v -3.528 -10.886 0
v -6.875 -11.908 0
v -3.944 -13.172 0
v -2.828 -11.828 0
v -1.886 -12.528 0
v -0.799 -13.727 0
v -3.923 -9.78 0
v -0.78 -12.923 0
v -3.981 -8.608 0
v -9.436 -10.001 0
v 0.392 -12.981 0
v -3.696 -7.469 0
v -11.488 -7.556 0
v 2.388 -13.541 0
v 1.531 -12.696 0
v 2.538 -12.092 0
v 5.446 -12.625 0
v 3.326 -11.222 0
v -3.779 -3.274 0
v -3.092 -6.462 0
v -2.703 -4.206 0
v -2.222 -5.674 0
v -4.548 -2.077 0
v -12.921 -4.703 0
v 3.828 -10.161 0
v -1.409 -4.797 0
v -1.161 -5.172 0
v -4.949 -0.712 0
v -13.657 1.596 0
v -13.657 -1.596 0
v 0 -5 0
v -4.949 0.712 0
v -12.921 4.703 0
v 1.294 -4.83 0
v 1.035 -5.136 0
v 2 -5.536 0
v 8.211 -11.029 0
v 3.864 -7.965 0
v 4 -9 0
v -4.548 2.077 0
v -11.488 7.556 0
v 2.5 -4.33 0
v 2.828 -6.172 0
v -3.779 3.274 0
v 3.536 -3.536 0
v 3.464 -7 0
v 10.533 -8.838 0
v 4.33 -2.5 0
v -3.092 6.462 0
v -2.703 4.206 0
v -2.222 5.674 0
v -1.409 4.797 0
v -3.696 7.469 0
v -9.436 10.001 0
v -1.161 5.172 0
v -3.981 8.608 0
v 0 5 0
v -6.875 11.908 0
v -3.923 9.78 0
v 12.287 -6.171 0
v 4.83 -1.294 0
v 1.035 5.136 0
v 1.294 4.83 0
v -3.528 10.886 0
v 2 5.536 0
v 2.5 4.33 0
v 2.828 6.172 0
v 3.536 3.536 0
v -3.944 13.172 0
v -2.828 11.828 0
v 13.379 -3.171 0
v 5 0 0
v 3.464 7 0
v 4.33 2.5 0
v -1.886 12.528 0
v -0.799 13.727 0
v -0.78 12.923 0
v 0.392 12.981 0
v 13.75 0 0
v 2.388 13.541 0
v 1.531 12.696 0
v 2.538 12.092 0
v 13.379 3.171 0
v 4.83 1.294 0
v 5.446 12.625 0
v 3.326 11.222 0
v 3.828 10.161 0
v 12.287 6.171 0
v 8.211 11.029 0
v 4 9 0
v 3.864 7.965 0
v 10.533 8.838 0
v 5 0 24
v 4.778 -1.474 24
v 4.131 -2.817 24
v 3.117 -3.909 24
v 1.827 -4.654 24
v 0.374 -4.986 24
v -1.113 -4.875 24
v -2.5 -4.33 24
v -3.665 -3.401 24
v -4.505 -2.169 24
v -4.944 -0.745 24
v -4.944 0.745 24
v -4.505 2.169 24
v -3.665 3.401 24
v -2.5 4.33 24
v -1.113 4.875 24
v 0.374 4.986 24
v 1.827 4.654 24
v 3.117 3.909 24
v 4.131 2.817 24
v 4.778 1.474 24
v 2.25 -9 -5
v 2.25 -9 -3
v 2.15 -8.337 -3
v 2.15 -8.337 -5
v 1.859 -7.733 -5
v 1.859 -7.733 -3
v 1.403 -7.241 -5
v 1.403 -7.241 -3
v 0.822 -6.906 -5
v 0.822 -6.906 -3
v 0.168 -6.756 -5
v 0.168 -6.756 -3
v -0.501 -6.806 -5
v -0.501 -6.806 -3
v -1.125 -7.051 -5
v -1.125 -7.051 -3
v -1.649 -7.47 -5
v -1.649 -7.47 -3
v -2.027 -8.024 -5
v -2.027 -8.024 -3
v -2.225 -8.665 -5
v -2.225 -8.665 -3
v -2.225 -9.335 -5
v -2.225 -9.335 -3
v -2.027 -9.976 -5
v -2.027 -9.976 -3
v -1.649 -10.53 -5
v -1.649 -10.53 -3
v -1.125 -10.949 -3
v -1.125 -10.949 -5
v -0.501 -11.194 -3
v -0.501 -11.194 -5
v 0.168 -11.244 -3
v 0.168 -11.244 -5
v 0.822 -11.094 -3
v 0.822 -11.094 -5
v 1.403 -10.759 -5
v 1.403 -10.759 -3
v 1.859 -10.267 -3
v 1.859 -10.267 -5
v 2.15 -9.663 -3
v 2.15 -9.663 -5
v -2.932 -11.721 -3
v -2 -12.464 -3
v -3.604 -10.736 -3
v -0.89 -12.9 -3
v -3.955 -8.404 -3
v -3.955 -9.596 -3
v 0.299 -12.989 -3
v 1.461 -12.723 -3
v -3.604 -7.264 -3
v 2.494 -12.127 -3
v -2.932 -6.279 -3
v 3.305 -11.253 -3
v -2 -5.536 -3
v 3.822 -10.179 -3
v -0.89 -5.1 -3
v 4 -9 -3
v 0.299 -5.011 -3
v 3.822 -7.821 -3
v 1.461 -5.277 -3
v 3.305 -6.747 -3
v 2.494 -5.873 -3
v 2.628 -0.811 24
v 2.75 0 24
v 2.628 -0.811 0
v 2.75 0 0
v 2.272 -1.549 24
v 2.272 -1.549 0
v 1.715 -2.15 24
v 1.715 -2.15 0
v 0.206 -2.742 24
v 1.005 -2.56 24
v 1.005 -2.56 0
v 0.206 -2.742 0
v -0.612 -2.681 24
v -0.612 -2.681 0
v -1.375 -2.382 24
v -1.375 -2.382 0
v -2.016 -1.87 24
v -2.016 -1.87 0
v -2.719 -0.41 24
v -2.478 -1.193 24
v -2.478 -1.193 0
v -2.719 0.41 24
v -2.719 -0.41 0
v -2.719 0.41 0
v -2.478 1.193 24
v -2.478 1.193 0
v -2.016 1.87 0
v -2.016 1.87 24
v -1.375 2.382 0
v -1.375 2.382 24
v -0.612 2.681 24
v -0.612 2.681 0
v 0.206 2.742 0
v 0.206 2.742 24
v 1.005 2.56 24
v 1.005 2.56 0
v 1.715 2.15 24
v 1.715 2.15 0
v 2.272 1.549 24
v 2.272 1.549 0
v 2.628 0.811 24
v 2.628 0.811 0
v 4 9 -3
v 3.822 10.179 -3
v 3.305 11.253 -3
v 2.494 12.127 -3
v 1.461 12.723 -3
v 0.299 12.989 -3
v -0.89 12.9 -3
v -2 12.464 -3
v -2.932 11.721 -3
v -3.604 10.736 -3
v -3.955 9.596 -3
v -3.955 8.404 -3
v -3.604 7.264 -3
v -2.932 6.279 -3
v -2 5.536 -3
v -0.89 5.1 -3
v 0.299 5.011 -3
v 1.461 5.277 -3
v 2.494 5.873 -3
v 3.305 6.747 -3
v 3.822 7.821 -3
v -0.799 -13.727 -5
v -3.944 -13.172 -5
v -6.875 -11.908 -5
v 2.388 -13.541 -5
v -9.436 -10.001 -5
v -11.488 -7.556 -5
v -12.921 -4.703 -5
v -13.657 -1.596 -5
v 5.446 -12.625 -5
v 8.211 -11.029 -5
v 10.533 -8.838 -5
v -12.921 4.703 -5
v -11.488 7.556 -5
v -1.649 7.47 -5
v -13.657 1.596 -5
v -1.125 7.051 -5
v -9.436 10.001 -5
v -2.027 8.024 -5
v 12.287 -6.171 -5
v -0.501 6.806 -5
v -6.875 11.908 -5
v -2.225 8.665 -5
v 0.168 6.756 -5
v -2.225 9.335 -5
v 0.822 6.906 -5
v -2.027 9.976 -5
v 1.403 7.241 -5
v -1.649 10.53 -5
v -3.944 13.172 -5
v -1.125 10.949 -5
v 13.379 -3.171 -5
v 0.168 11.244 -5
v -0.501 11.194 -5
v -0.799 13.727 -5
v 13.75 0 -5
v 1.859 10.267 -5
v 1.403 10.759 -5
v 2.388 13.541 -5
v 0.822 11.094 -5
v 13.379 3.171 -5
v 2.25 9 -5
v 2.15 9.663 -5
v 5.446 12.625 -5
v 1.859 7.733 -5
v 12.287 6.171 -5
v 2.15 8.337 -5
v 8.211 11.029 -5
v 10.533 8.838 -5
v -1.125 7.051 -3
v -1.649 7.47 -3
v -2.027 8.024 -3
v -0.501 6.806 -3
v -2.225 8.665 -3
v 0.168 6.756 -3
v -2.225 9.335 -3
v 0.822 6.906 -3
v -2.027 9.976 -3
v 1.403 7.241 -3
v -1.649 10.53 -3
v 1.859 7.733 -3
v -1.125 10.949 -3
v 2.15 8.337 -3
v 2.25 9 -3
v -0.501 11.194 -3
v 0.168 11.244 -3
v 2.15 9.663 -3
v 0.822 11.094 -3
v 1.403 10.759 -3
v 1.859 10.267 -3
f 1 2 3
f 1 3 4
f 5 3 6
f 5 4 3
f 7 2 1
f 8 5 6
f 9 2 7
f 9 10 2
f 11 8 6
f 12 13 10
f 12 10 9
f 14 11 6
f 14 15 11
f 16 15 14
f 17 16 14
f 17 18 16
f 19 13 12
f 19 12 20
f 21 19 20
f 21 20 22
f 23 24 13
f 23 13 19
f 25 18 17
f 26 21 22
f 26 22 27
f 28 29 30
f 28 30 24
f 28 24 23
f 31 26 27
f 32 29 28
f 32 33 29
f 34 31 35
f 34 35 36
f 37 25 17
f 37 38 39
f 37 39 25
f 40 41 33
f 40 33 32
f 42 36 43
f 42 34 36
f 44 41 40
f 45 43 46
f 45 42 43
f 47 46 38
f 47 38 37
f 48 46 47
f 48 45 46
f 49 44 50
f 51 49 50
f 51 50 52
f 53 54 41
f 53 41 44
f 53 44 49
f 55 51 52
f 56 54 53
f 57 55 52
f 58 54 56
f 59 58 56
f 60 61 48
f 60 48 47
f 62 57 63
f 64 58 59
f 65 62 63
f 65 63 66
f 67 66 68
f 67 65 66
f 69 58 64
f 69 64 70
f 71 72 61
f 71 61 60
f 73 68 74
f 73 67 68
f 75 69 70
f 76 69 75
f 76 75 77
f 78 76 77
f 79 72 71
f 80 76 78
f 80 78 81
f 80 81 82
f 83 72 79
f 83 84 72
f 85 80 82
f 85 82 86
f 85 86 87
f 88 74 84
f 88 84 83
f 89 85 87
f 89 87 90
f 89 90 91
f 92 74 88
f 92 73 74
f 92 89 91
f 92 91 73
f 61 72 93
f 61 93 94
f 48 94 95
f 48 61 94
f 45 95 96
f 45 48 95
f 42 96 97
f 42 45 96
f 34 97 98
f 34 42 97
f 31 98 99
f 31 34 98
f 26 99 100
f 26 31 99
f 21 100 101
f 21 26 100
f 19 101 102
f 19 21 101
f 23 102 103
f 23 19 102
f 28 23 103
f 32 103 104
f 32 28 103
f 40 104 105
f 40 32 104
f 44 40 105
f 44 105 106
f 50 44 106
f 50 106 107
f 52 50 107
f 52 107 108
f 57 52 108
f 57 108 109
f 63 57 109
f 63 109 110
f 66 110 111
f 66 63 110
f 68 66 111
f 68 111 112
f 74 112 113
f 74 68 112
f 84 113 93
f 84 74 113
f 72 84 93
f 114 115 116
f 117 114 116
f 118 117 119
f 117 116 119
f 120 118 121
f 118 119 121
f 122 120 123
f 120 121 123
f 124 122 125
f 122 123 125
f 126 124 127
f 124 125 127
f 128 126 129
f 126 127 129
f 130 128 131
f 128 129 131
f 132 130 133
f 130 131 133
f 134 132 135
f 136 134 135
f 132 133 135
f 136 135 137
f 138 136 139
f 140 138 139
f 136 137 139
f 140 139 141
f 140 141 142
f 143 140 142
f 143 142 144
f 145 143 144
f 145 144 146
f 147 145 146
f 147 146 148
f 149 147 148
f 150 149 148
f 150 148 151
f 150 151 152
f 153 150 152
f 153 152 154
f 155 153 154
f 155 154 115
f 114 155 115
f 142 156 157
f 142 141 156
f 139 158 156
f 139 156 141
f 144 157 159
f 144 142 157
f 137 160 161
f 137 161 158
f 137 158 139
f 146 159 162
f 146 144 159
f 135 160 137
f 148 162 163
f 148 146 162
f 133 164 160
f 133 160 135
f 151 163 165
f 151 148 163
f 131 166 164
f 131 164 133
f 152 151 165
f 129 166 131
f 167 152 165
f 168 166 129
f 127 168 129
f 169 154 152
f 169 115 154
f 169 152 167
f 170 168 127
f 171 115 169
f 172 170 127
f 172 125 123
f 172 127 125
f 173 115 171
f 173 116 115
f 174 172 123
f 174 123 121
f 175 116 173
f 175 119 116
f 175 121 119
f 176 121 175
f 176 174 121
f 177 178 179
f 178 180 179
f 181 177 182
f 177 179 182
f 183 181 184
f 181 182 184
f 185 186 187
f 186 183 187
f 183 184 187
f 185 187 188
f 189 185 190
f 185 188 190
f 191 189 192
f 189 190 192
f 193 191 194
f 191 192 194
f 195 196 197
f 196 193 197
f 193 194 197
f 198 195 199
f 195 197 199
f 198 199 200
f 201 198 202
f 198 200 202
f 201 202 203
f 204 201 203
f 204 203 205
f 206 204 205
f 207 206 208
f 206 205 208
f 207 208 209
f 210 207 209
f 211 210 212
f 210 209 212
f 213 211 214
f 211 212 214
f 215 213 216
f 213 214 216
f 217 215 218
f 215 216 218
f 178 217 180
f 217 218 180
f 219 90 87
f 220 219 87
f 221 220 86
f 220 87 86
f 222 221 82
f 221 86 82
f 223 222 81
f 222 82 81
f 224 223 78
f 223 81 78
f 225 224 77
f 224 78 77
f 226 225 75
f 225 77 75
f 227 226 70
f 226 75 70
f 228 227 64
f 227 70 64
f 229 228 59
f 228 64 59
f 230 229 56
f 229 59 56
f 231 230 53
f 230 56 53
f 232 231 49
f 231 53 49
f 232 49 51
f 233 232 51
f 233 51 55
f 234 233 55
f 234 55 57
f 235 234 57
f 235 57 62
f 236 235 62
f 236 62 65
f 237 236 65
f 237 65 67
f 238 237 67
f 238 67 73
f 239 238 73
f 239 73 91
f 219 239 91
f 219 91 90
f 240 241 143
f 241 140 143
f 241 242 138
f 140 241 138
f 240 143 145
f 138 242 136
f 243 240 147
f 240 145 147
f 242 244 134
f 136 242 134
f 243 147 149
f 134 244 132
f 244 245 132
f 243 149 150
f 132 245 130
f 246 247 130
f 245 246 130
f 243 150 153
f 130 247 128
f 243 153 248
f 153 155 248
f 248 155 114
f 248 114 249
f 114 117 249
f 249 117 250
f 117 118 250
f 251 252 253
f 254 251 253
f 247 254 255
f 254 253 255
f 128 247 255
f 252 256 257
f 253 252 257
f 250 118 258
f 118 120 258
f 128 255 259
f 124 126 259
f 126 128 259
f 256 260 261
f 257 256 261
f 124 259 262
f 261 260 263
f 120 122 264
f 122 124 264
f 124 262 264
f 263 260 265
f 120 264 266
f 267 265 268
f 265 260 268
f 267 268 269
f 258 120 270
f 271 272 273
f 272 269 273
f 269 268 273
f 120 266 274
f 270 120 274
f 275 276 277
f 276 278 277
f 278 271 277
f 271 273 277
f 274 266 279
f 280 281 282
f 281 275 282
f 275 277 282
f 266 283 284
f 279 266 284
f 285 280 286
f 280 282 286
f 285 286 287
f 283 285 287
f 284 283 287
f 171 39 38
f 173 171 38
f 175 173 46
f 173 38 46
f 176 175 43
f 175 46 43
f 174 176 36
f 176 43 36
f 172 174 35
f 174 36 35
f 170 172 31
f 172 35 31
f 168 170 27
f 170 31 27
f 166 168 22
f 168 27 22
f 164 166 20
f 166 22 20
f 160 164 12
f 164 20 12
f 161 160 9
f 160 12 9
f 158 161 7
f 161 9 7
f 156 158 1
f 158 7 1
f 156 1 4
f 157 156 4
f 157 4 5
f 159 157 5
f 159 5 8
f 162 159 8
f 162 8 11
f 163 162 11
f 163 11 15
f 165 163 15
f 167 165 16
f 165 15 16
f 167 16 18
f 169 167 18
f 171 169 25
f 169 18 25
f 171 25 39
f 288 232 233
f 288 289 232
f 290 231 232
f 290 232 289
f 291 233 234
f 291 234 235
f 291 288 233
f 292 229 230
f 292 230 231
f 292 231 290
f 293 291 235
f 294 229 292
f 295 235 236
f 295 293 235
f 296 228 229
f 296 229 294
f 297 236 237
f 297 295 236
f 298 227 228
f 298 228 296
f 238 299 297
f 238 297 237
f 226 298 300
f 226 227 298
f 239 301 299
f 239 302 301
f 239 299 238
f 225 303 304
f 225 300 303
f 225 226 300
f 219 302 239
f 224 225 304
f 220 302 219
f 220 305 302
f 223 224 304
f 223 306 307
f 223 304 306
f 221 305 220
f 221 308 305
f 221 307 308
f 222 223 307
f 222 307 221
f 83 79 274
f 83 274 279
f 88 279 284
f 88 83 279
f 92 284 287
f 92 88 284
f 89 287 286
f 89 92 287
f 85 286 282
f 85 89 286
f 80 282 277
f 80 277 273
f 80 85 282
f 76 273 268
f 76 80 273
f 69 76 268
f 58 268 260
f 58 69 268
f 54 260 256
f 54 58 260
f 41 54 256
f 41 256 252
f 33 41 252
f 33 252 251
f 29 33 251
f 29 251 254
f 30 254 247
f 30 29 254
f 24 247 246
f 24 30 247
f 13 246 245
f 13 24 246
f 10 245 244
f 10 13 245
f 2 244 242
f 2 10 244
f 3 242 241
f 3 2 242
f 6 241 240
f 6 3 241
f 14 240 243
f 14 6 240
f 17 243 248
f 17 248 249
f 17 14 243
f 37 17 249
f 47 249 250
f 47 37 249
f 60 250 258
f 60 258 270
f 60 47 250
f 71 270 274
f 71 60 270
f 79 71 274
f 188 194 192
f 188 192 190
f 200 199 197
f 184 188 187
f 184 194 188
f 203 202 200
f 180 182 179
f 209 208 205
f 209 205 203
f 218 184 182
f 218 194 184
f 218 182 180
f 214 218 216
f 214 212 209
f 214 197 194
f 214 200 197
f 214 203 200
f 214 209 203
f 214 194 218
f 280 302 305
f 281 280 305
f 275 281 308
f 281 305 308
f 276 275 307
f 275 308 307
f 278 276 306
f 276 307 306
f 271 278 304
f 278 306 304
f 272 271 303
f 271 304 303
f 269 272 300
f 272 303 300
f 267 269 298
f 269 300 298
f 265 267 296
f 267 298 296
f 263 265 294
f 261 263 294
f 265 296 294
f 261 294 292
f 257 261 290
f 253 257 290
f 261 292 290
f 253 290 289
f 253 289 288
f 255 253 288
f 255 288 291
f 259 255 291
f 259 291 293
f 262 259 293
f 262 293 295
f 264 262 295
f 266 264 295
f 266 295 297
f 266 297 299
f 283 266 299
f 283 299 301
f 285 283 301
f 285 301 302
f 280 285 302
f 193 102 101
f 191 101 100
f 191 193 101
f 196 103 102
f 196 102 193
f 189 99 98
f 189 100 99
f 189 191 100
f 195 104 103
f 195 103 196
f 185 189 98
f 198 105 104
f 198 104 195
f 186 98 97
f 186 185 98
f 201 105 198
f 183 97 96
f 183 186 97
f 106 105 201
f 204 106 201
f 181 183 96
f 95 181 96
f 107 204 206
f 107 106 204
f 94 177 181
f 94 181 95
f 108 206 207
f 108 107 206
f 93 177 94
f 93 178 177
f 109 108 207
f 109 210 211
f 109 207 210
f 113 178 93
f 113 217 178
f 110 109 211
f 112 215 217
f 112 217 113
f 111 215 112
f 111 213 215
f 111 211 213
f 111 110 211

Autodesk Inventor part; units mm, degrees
ref_plane "YZ Plane" through (0, 0, 0) normal (1, 0, 0) x (0, 1, 0)
ref_plane "XZ Plane" through (0, 0, 0) normal (0, 1, 0) x (-1, 0, 0)
ref_plane "XY Plane" through (0, 0, 0) normal (0, 0, 1) x (1, 0, 0)
sketch "Skizze1" plane through (0, 0, 0) normal (0, 0, 1) x (1, 0, 0)
  circle A0 centre (0, 0) radius 13.75
  circle A1 centre (0, 0) radius 5
  line L0 (0, 13.75) -> (0, -13.75) construction
  circle A2 centre (0, 9) radius 4
  circle A3 centre (0, 9) radius 2.25
  circle A4 centre (0, -9) radius 4
  circle A5 centre (0, -9) radius 2.25
  line L1 (-13.75, 0) -> (13.75, 0) construction
  circle A6 centre (0, 0) radius 2.75
  circle A7 centre (0, 0) radius 3.5
  dimension "d0" = 27.5
  dimension "d1" = 10
  dimension "d4" = 8
  dimension "d5" = 18
  dimension "d6" = 4.5
  dimension "d7" = 5.5
  dimension "d14" = 7
extrude "Extrusion1" add sketch "Skizze1" against normal blind 5 contours A0 | A1 | A4 | A2 | A6 | A7
extrude "Extrusion2" cut sketch "Skizze1" against normal blind 3 contours A4 | A2
extrude "Extrusion3" add sketch "Skizze1" along normal blind 24 contours A1
extrude "Extrusion4" add sketch "Skizze1" along normal blind 24 contours A7
properties part number "Schalter_Basis_rund"
